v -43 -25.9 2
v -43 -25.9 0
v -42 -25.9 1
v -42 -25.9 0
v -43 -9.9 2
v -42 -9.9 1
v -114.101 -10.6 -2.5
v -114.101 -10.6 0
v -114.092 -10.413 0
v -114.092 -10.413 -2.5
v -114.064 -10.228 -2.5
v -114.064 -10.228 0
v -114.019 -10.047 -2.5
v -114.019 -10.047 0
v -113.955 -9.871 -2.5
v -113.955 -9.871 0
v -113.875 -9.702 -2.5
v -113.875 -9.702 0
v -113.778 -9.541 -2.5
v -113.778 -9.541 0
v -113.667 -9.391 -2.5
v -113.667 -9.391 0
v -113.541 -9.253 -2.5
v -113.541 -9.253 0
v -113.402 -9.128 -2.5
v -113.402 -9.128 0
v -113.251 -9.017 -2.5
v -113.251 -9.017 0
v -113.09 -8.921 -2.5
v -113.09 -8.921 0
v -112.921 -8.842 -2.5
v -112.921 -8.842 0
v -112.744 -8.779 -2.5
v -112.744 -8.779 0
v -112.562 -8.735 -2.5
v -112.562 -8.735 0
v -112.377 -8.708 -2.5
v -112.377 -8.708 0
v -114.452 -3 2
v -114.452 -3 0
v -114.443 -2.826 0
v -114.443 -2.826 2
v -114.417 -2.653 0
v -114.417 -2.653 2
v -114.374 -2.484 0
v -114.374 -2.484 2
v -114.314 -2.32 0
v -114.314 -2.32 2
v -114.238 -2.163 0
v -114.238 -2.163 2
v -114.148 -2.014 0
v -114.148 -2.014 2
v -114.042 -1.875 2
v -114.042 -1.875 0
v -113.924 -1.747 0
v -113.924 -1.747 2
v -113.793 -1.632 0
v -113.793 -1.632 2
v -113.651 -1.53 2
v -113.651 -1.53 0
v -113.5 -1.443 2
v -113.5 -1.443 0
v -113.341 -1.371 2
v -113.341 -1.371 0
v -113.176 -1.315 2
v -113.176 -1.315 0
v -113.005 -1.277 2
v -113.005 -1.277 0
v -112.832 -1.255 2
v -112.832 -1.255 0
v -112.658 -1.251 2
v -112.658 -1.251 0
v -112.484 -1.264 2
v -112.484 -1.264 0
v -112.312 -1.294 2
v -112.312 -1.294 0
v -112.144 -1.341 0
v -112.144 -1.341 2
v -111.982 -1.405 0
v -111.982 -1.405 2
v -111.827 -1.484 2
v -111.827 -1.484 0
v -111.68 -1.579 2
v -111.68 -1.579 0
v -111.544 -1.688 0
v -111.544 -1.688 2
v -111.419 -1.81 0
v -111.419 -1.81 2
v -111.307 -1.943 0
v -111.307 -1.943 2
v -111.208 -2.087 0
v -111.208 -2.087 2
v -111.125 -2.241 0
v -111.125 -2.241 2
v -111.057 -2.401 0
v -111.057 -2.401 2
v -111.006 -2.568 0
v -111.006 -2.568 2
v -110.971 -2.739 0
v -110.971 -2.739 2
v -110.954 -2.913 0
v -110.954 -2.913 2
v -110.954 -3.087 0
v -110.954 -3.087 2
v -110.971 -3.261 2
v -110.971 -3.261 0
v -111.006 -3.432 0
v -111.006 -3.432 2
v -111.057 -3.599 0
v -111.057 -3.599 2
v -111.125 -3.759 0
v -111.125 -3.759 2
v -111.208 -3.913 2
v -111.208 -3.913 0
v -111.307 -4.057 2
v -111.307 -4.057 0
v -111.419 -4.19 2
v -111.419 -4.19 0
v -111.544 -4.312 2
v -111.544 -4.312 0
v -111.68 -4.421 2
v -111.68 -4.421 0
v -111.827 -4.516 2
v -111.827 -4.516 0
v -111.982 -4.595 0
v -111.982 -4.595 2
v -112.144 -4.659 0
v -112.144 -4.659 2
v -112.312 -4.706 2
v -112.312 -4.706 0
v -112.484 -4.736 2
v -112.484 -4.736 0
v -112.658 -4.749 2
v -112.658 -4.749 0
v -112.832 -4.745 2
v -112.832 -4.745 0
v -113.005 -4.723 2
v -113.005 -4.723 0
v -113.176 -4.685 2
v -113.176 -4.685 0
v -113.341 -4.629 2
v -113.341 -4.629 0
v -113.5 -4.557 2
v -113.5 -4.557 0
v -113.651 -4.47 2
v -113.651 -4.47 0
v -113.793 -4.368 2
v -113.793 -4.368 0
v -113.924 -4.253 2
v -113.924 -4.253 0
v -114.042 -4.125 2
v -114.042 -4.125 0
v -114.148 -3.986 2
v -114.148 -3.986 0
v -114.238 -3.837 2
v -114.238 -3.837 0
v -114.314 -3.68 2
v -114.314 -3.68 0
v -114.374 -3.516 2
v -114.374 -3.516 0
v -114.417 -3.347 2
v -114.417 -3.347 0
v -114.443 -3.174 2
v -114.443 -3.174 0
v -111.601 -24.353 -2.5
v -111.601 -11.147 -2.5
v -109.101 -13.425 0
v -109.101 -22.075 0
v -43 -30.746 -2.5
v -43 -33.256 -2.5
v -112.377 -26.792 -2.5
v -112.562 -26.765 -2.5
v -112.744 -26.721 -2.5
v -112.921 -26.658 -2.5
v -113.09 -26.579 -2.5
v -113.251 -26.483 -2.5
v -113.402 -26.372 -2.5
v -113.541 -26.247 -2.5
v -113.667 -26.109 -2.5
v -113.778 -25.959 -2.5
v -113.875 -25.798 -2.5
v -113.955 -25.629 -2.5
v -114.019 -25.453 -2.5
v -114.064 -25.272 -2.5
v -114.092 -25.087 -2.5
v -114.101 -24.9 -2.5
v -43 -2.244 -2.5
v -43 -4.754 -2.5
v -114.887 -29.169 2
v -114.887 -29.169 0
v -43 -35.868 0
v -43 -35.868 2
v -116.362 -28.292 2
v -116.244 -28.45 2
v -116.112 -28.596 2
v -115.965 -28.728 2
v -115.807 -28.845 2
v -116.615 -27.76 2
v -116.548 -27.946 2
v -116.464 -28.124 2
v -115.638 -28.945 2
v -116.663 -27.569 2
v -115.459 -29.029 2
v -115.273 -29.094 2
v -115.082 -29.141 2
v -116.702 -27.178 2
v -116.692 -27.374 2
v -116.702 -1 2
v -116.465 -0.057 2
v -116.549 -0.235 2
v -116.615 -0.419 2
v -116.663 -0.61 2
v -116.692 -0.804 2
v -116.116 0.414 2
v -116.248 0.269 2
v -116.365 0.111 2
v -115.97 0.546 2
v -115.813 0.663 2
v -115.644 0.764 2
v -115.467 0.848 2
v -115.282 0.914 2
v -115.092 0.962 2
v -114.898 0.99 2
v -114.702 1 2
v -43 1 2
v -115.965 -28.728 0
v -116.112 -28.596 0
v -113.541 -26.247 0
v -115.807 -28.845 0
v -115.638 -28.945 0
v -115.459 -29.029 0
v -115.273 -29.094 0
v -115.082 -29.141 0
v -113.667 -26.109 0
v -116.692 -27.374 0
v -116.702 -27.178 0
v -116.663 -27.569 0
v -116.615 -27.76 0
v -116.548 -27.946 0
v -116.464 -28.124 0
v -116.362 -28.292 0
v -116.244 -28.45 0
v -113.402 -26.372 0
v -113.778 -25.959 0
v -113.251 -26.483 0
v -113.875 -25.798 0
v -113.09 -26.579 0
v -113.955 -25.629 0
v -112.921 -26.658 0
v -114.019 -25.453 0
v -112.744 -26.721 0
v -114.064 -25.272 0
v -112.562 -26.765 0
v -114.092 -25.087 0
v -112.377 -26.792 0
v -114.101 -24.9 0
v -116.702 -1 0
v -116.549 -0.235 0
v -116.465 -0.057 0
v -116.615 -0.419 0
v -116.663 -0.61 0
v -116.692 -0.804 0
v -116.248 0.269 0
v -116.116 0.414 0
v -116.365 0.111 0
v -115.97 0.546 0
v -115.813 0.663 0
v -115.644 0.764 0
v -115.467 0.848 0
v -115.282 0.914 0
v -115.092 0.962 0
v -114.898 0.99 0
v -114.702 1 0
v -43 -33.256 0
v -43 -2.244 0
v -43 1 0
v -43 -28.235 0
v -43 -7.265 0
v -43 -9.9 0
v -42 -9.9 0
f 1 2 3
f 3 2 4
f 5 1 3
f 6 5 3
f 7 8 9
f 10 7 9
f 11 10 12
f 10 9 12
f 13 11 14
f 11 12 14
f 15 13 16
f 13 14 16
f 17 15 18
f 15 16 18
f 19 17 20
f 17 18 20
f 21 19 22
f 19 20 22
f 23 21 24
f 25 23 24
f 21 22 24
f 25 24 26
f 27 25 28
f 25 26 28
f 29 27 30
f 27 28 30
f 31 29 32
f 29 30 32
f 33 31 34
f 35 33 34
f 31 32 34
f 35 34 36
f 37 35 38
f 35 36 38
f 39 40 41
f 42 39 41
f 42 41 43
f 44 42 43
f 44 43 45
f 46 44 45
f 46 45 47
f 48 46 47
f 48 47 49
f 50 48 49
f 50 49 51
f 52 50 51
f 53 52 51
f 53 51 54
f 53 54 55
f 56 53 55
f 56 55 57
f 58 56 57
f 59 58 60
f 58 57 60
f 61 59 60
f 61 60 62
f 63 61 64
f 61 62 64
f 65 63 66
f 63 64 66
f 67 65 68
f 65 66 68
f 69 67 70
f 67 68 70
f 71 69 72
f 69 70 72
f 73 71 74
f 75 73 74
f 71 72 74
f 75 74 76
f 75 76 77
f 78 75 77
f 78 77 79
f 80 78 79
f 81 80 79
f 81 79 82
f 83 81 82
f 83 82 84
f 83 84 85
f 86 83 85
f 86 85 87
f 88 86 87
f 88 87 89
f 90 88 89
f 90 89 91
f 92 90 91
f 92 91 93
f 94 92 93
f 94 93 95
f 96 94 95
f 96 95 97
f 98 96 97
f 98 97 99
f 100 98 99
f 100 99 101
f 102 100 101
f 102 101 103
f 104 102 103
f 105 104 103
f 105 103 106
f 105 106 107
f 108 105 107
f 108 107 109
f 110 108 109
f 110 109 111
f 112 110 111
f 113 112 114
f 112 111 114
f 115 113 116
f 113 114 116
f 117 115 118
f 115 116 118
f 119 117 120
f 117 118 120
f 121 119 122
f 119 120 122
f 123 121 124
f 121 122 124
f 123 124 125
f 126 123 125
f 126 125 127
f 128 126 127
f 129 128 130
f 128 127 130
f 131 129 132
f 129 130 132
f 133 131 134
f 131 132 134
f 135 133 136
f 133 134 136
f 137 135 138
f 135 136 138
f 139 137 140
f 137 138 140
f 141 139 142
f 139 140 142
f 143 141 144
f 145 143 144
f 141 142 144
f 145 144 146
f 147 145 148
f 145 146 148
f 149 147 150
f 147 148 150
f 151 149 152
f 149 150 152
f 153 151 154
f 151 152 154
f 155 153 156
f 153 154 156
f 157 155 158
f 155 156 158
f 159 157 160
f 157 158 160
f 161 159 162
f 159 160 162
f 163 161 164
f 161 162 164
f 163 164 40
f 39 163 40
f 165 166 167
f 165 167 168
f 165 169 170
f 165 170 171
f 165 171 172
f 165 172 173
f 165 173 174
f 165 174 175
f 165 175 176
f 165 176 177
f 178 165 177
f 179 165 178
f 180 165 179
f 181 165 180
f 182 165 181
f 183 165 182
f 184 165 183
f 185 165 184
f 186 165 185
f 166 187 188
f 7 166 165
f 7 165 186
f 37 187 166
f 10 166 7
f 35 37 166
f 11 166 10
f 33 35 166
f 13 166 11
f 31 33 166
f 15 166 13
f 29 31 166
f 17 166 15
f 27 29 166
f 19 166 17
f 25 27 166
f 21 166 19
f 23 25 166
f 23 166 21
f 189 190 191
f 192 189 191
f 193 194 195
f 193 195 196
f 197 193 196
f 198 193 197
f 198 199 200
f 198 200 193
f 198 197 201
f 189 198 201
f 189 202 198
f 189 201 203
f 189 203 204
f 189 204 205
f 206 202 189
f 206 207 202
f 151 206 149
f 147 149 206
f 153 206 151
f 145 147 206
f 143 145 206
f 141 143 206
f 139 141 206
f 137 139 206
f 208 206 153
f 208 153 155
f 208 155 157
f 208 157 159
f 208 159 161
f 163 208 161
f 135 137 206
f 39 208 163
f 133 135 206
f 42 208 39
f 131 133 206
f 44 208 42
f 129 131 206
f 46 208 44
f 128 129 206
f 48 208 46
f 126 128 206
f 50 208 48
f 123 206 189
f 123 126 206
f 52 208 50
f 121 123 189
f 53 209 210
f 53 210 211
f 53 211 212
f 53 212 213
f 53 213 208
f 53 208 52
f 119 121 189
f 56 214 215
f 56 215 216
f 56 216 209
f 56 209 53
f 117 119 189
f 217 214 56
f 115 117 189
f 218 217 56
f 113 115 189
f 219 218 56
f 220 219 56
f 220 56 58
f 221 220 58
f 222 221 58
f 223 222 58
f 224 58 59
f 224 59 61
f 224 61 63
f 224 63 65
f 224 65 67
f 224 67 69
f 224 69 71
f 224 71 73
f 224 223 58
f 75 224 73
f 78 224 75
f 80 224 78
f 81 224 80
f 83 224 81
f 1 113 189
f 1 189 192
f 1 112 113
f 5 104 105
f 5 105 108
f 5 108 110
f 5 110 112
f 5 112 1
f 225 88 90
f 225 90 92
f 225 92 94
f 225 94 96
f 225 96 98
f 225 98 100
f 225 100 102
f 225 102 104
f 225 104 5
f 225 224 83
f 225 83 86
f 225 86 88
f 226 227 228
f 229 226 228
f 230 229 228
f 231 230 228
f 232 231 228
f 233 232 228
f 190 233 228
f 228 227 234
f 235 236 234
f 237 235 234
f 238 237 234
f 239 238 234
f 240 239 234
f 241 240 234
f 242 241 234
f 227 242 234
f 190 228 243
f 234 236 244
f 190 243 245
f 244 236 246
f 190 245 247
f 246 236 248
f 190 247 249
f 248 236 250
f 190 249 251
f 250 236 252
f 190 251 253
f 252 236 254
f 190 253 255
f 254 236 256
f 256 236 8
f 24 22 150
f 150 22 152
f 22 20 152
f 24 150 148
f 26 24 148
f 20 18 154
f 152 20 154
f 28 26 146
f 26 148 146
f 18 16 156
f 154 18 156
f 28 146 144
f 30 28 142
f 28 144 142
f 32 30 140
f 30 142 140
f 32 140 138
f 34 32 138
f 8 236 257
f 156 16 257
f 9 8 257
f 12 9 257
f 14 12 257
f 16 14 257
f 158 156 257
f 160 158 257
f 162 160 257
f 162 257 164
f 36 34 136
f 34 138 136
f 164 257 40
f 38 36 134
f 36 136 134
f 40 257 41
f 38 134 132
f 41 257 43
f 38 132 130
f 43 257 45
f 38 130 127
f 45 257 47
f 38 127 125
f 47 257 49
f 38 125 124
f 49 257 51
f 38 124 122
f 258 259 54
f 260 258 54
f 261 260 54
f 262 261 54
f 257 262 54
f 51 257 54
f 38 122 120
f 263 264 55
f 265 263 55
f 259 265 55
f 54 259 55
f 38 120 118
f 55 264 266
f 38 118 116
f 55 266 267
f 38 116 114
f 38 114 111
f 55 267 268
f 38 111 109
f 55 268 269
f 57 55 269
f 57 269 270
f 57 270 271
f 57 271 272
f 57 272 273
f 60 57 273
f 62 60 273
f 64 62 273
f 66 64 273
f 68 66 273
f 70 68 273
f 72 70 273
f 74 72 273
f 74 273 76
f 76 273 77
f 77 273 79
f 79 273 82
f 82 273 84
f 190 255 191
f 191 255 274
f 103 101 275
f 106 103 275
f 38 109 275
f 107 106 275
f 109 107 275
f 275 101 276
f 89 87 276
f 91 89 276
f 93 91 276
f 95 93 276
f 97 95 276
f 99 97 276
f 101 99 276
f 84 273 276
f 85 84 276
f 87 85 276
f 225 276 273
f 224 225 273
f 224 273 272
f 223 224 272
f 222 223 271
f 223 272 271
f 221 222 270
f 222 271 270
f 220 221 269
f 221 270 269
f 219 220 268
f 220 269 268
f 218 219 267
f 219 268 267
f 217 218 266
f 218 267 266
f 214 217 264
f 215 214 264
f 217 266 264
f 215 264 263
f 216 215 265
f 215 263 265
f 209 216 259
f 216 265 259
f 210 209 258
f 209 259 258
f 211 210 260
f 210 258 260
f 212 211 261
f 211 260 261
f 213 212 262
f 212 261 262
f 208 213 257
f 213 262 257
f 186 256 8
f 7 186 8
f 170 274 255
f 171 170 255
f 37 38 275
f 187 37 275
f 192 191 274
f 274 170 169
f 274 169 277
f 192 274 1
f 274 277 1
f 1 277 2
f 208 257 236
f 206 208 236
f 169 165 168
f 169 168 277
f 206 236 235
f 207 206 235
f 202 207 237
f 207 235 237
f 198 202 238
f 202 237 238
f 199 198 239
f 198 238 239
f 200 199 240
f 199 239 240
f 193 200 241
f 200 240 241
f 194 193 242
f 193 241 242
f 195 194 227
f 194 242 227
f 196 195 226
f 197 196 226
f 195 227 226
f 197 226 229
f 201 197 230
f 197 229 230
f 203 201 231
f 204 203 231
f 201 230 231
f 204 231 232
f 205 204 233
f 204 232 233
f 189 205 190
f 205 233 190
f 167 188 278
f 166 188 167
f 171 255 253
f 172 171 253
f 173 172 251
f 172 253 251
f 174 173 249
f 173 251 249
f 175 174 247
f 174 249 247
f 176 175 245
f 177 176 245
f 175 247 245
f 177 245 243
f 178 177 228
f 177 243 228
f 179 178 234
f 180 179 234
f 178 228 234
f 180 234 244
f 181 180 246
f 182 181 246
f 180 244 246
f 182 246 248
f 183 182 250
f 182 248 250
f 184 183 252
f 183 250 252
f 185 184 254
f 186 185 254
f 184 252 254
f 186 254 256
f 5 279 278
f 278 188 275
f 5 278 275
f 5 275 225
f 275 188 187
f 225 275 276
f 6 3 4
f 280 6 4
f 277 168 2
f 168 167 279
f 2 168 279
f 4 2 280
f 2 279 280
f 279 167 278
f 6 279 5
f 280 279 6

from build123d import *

# Parameters (mm, degrees)
BOSS_EXTRUDE1_DEPTH = 2
BOSS_EXTRUDE2_DEPTH = 8
BOSS_EXTRUDE3_DEPTH = 2.5
CHAMFER1_SIZE       = 2.5
SKETCH5_R           = 1.75
CUT_EXTRUDE1_DEPTH  = 123.114698641


with BuildPart() as part:
    # Sketch1 → Boss-Extrude1 (new body)
    with BuildSketch(Plane.XY):
        with BuildLine():
            Line((-43, -35.867648288), (-43, 1))
            Line((-43, 1), (-114.701591379, 1))
            ThreePointArc((-114.701591379, 1), (-116.115804942, 0.414213562), (-116.701591379, -1))
            Line((-116.701591379, -1), (-116.701591379, -4.677699552))
            Line((-116.701591379, -4.677699552), (-116.701591379, -27.177699552))
            ThreePointArc((-116.701591379, -27.177699552), (-116.179955267, -28.524711139), (-114.887151163, -29.169072838))
            Line((-114.887151163, -29.169072838), (-43, -35.867648288))
        make_face()
    extrude(amount=BOSS_EXTRUDE1_DEPTH)

    # Sketch3 → Boss-Extrude2 (add, symmetric)
    with BuildSketch(Plane(origin=(0, -17.899660586, 0), x_dir=(-1, 0, 0), z_dir=(0, -1, 0))):
        Polygon((42, -1), (42, 0), (43, 0), (43, -2), align=None)
    extrude(amount=BOSS_EXTRUDE2_DEPTH, both=True)

    # Sketch4 → Boss-Extrude3 (add)
    with BuildSketch(Plane(origin=(0, 0, 0), x_dir=(-1, 0, 0), z_dir=(0, 0, -1))):
        with BuildLine():
            Line((114.100916052, -24.89988692), (114.100916052, -10.60011308))
            ThreePointArc((114.100916052, -10.60011308), (113.605361745, -9.320452072), (112.377197846, -8.708308458))
            Line((112.377197846, -8.708308458), (43, -2.243615022))
            Line((43, -2.243615022), (43, -4.754445128))
            Line((43, -4.754445128), (111.600916052, -11.146803215))
            Line((111.600916052, -11.146803215), (111.600916052, -24.353196785))
            Line((111.600916052, -24.353196785), (43, -30.745554872))
            Line((43, -30.745554872), (43, -33.256384978))
            Line((43, -33.256384978), (112.377197846, -26.791691542))
            ThreePointArc((112.377197846, -26.791691542), (113.605361745, -26.179547928), (114.100916052, -24.89988692))
        make_face()
    extrude(amount=BOSS_EXTRUDE3_DEPTH)

    # Chamfer1
    chamfer1_edges = [part.edges().sort_by_distance(p)[0] for p in [
        (-77.300458026, -27.549375828, 0),
        (-111.600916052, -17.75, 0),
        (-77.300458026, -7.950624172, 0),
    ]]
    chamfer(chamfer1_edges, length=CHAMFER1_SIZE - 0.0001)  # a hair under: the kernel refuses the full size

    # Sketch5 → Cut-Extrude1 (cut, through all)
    with BuildSketch(Plane(origin=(0, 0, 0), x_dir=(-1, 0, 0), z_dir=(0, 0, -1))):
        with Locations((112.701591379, -3)):
            Circle(SKETCH5_R)
    extrude(amount=-CUT_EXTRUDE1_DEPTH, mode=Mode.SUBTRACT)


solid = part.part
